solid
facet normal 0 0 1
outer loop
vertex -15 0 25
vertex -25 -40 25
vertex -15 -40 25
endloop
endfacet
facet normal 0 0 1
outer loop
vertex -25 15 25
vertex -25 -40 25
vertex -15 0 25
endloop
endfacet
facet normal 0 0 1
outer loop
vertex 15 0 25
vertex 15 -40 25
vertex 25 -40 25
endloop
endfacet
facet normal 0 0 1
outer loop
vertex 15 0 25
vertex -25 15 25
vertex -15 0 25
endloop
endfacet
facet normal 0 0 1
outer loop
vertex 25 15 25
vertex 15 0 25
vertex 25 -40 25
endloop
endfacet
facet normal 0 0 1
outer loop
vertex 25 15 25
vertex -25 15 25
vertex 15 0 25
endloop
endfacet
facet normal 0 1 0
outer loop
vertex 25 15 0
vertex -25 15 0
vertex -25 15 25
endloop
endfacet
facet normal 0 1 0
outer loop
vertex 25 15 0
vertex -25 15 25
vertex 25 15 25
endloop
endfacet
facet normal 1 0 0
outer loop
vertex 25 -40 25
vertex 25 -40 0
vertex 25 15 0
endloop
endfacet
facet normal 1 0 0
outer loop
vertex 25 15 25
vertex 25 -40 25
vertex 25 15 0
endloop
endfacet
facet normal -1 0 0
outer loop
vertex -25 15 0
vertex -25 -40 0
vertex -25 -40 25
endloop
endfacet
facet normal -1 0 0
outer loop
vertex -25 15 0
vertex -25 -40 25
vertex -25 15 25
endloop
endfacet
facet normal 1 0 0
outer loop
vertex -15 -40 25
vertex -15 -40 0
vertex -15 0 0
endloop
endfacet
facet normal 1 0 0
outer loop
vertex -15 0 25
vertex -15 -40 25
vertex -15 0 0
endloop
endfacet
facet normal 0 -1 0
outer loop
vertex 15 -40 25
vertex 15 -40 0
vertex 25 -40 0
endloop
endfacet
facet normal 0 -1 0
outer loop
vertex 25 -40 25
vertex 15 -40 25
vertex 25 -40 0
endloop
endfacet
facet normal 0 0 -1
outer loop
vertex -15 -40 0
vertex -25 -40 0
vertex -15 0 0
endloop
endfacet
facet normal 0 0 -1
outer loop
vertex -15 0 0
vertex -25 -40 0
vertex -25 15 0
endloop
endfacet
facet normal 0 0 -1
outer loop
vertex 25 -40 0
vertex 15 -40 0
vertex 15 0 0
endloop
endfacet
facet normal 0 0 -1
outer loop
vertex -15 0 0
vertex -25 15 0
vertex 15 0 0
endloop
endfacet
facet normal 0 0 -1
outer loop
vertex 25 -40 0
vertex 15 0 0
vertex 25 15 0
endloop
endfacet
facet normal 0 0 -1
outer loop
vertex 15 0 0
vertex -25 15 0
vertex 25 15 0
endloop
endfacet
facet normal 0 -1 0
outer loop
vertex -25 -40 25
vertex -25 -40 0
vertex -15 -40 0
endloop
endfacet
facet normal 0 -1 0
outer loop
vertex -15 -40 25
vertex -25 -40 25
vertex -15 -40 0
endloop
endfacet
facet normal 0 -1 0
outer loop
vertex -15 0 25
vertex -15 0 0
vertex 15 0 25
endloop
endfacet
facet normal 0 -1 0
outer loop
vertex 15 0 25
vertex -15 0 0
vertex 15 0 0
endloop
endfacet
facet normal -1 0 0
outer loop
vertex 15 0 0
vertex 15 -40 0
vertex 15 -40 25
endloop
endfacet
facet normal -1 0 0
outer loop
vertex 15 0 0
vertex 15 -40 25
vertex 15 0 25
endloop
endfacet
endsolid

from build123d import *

# Parameters (mm, degrees)
SKETCH1_W           = 50
SKETCH1_H           = 15
BOSS_EXTRUDE1_DEPTH = 25
SKETCH2_W           = 10
SKETCH2_H           = 41
BOSS_EXTRUDE2_DEPTH = 25
SKETCH3_W           = 10
SKETCH3_H           = 41
BOSS_EXTRUDE3_DEPTH = 25


with BuildPart() as part:
    # Sketch1 → Boss-Extrude1 (new body)
    with BuildSketch(Plane.XY):
        with Locations((0, 7.5)):
            Rectangle(SKETCH1_W, SKETCH1_H)
    extrude(amount=BOSS_EXTRUDE1_DEPTH)

    # Sketch2 → Boss-Extrude2 (add)
    with BuildSketch(Plane.XY):
        with Locations((-20, -19.5)):
            Rectangle(SKETCH2_W, SKETCH2_H)
    extrude(amount=BOSS_EXTRUDE2_DEPTH)

    # Sketch3 → Boss-Extrude3 (add)
    with BuildSketch(Plane.XY):
        with Locations((20, -19.5)):
            Rectangle(SKETCH3_W, SKETCH3_H)
    extrude(amount=BOSS_EXTRUDE3_DEPTH)


solid = part.part
